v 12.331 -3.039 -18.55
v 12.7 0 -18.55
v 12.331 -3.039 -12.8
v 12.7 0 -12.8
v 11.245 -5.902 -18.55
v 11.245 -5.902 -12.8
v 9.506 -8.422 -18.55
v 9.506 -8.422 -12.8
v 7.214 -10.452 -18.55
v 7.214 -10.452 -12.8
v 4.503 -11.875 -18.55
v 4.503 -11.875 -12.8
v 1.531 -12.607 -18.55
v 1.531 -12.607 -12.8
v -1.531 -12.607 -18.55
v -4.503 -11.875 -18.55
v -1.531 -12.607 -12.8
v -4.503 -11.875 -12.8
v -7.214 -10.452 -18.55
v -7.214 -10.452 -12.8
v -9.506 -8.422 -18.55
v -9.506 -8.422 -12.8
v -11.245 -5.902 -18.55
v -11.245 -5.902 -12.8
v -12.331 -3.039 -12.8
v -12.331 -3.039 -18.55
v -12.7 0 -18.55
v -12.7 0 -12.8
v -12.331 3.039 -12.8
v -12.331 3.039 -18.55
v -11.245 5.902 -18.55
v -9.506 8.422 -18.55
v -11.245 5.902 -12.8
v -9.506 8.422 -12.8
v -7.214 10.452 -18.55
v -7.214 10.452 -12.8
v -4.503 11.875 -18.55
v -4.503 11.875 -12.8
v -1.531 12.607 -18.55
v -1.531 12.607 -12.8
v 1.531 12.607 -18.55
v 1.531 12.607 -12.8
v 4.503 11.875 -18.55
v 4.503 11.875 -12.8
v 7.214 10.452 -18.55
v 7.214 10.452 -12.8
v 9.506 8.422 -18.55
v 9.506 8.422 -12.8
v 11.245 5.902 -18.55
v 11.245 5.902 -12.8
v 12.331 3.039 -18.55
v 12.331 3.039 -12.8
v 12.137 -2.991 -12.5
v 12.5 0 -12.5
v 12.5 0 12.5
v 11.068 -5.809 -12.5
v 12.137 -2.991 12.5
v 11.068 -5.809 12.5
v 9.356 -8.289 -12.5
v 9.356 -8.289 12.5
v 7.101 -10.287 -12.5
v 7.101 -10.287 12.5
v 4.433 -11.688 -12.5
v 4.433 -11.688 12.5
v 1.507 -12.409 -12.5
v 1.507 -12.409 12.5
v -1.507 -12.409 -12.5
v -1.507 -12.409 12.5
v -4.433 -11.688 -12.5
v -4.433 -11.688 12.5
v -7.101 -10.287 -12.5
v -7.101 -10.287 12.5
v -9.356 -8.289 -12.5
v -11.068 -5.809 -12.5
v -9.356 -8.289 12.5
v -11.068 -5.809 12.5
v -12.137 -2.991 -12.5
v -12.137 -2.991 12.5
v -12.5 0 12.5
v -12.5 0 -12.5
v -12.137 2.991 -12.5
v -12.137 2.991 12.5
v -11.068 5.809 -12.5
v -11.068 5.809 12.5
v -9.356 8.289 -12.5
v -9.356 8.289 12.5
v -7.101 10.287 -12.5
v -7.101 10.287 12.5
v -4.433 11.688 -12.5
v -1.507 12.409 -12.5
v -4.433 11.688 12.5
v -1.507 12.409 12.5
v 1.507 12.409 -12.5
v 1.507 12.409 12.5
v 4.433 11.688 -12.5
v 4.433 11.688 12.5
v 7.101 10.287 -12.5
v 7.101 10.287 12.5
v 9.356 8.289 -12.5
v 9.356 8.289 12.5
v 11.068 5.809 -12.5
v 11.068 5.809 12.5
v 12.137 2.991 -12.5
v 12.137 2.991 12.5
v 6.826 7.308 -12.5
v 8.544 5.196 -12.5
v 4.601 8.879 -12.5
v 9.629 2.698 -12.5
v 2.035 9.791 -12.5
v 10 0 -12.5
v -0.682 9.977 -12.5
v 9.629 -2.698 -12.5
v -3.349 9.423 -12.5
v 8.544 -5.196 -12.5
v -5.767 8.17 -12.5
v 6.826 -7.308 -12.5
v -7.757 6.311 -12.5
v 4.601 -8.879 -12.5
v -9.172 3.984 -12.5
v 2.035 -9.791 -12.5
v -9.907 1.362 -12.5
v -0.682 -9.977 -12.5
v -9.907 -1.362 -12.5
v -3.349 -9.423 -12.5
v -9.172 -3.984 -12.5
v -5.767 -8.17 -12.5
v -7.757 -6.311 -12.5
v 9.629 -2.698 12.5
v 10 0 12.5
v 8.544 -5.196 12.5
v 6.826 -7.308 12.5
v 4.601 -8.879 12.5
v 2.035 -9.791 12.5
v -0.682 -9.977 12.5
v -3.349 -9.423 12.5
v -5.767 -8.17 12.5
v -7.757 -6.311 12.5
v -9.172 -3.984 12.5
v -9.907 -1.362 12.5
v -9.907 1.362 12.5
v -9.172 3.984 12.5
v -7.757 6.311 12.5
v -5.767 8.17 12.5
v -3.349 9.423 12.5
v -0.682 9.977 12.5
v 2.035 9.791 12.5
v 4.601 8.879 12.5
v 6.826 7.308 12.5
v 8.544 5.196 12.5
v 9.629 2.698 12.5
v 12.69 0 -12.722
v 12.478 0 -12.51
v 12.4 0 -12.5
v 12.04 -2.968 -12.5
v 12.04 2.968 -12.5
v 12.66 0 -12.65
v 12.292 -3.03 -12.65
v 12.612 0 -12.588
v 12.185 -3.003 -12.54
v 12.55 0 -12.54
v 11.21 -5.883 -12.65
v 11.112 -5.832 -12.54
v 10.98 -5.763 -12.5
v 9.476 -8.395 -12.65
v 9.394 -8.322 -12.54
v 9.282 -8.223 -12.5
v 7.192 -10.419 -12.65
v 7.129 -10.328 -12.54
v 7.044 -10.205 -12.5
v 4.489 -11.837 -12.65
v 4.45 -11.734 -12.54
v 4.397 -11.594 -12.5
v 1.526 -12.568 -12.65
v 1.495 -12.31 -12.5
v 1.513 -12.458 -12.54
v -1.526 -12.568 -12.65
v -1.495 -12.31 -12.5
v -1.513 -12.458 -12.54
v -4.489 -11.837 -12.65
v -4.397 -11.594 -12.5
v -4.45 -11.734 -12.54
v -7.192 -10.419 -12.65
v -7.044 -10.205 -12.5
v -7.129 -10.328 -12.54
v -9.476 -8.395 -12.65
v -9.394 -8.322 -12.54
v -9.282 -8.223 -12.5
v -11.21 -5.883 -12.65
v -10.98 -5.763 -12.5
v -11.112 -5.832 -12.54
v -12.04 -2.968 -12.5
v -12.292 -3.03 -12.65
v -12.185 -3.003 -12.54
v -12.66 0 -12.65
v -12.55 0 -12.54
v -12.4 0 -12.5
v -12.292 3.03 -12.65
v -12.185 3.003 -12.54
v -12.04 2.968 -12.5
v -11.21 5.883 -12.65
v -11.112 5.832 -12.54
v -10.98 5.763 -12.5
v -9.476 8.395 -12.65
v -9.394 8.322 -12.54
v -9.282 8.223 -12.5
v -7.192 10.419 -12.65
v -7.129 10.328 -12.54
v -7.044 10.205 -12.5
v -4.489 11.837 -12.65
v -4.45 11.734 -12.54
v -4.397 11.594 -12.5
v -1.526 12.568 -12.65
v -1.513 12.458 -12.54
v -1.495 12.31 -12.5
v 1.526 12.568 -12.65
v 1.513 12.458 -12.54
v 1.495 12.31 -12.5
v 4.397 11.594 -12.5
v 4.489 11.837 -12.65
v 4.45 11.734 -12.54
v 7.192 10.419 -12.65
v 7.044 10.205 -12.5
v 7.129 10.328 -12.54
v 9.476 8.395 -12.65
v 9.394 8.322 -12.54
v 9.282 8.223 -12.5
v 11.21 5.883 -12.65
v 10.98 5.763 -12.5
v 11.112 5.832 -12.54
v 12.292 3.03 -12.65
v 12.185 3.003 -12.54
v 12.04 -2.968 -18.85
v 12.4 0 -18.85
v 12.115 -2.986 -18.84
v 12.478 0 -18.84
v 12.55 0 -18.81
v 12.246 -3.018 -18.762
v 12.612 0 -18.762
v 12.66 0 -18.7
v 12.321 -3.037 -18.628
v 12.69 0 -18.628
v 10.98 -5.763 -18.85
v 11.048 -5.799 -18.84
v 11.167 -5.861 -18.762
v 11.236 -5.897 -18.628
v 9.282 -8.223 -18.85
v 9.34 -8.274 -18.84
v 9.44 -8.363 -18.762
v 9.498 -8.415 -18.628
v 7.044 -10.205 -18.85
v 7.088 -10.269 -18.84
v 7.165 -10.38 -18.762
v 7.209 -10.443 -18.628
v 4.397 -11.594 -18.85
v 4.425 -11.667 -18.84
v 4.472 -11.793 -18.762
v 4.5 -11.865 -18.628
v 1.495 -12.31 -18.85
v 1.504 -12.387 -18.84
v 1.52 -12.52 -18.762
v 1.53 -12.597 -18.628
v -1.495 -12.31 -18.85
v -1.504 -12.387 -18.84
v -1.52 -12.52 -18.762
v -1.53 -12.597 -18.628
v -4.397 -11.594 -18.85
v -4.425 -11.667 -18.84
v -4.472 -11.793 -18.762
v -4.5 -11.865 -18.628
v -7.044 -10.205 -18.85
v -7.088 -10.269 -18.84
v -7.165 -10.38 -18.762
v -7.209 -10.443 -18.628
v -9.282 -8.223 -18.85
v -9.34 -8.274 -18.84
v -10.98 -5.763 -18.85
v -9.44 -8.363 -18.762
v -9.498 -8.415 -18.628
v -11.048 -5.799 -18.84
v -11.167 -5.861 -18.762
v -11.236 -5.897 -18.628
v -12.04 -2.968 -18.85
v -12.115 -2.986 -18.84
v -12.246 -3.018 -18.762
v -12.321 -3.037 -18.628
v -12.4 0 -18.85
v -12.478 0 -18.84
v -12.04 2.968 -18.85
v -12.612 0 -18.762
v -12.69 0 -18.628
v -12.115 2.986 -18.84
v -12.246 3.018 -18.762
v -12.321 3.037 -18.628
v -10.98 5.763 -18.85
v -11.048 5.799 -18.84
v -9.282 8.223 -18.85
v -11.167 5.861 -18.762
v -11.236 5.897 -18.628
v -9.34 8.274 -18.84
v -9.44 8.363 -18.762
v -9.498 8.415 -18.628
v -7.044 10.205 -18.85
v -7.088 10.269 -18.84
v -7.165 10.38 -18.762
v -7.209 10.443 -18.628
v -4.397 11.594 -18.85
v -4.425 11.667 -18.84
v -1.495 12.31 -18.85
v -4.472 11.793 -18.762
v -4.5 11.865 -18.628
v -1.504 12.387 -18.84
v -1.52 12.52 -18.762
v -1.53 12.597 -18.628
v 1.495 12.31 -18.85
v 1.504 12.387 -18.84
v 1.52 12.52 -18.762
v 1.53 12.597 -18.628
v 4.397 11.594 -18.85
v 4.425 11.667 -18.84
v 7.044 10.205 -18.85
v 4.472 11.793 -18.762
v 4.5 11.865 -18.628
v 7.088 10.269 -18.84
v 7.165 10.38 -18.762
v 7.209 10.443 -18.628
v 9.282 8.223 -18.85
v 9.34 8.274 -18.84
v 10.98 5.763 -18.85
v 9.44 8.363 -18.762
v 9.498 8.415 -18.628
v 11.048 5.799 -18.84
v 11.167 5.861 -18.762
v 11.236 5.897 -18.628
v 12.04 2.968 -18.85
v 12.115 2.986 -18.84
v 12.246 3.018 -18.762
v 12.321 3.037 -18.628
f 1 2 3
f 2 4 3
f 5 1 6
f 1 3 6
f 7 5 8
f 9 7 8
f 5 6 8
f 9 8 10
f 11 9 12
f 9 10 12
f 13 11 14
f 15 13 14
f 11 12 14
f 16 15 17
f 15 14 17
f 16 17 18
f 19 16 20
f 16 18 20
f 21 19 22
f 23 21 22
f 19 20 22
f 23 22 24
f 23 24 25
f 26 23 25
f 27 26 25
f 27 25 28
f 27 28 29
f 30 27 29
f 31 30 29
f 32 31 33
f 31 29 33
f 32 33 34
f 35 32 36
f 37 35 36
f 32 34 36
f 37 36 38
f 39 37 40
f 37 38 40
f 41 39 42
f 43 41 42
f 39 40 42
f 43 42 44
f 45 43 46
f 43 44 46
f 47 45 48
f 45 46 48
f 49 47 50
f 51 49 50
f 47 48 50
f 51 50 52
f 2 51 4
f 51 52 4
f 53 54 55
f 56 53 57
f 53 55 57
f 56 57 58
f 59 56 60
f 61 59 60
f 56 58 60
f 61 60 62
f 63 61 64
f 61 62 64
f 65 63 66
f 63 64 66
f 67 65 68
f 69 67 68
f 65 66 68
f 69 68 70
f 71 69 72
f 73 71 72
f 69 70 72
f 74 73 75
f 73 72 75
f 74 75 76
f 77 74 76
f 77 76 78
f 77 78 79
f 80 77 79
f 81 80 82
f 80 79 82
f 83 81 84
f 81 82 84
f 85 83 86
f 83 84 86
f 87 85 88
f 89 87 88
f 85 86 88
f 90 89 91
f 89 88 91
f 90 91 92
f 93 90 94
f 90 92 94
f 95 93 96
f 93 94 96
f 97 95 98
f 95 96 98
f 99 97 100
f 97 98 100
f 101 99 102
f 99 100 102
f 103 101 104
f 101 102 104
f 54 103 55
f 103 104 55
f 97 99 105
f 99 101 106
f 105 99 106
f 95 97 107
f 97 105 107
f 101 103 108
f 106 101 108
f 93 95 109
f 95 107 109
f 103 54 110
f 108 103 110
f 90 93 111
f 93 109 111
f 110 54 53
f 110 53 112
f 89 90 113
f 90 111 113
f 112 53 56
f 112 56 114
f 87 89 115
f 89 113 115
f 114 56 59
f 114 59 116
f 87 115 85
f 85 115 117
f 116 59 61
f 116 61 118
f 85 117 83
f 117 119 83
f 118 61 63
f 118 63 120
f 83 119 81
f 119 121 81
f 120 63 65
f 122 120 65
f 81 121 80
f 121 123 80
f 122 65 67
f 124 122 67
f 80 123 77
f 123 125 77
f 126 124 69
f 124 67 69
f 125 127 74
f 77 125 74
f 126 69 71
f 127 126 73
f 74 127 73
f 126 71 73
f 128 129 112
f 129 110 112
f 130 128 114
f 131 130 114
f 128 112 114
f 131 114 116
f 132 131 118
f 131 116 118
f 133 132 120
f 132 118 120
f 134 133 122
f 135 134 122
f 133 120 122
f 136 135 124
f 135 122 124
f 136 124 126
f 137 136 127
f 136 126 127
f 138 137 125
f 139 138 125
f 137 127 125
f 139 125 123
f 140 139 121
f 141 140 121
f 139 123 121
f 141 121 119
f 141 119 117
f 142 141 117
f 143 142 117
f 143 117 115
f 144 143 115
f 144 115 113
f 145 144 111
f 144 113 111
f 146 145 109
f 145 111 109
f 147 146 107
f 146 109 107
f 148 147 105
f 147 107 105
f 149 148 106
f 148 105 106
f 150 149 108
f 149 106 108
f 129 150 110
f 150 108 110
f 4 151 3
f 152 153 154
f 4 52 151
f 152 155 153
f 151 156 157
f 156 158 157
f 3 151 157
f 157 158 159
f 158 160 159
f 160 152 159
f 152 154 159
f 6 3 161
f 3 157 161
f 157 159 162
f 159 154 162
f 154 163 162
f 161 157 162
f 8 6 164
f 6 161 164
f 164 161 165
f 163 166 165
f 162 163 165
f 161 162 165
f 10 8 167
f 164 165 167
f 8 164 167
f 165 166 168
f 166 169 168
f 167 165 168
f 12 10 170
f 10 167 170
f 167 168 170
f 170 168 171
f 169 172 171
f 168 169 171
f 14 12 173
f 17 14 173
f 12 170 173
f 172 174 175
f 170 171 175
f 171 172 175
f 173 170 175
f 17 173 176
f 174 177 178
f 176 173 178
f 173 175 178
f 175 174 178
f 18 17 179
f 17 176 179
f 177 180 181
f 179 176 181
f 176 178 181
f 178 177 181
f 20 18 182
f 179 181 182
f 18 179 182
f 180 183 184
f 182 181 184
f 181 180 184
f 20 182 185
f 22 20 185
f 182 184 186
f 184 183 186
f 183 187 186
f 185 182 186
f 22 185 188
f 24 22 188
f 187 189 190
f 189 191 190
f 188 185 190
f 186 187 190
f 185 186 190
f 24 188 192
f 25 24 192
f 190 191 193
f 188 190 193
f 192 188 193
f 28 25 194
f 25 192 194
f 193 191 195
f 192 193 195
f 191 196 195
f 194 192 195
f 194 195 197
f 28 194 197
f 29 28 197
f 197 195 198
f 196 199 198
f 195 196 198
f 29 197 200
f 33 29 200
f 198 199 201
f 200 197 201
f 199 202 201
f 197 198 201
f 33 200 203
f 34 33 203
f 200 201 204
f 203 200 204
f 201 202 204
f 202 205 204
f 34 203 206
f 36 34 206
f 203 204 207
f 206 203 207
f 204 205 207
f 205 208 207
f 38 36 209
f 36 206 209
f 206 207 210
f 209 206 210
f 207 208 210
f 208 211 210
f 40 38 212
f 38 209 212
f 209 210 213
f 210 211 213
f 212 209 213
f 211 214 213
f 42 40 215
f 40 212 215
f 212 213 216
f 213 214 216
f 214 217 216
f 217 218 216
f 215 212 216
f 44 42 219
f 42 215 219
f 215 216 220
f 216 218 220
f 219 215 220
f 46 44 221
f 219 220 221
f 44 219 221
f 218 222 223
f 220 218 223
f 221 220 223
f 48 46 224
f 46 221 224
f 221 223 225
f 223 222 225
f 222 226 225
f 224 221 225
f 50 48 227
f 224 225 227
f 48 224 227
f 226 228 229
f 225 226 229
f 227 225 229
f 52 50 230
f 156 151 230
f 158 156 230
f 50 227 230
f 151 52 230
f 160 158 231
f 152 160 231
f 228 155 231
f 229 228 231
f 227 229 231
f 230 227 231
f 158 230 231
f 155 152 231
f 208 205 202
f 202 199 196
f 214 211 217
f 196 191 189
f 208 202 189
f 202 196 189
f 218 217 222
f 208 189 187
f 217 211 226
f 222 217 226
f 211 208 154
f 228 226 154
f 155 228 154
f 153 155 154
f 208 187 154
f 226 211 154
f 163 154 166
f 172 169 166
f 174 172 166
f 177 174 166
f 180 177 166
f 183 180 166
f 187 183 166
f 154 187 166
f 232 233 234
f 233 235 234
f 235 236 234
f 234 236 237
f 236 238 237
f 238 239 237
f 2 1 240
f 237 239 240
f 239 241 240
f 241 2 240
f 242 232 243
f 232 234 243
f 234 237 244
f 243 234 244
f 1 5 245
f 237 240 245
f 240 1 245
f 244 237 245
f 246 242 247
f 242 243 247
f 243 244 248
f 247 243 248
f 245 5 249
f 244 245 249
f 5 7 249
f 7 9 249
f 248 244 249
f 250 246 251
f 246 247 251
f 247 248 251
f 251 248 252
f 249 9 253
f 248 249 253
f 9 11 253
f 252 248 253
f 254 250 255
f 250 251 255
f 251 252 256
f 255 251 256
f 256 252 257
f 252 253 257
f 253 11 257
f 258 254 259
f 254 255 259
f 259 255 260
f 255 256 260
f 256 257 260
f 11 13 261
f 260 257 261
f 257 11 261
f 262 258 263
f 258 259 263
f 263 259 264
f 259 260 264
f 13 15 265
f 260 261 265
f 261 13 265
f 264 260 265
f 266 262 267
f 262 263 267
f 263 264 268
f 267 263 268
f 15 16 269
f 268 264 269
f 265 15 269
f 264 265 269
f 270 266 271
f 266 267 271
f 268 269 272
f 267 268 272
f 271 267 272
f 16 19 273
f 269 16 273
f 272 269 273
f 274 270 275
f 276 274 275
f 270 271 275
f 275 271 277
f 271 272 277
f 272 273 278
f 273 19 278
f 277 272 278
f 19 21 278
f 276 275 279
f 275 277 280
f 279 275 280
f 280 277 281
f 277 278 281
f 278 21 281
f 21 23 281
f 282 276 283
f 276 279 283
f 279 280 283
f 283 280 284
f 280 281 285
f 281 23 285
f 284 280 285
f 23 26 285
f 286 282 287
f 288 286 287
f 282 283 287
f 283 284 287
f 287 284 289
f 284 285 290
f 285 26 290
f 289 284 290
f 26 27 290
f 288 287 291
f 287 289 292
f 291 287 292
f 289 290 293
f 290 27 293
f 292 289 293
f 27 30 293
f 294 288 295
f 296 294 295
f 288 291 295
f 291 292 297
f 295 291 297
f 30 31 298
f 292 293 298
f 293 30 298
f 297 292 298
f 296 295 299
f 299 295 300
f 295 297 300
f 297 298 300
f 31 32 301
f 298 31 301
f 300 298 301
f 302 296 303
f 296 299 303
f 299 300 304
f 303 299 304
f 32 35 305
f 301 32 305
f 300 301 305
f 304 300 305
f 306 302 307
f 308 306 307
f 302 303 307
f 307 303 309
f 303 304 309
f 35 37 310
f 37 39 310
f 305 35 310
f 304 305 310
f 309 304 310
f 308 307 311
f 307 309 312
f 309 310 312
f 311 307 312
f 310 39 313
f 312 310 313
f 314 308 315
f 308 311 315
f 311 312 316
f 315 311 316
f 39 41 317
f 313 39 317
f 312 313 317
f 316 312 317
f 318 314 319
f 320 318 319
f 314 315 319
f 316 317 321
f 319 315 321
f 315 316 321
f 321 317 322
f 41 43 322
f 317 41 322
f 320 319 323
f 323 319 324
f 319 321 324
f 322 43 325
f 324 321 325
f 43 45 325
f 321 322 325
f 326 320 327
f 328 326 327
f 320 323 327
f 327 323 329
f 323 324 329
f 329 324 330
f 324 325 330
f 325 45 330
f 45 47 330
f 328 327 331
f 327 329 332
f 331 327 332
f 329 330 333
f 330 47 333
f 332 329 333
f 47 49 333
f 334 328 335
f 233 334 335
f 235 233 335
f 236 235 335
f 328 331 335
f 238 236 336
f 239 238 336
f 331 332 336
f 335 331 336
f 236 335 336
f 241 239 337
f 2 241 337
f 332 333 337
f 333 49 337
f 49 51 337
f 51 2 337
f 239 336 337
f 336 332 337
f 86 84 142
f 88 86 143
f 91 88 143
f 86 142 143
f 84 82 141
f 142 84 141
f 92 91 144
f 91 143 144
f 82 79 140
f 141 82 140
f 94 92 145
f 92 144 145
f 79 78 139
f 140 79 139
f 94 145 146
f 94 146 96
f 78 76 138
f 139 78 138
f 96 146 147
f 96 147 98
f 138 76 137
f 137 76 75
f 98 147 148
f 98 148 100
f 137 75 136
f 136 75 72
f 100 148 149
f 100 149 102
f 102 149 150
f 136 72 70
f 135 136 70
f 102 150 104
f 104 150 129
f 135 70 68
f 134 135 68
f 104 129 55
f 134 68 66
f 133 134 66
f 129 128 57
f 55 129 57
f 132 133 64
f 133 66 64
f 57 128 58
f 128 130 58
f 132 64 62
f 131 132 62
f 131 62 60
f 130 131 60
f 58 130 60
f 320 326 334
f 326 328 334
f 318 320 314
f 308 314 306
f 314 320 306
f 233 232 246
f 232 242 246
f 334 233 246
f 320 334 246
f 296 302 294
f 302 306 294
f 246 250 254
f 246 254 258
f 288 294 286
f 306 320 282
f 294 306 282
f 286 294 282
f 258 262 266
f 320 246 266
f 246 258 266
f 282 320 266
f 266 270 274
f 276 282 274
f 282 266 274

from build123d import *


with BuildPart() as f1:
    # F0 (on Front) → F1 (revolve)
    with BuildSketch(Plane.XZ):
        Polygon((12.5, 12.5), (10, 12.5), (10, -12.5), (12.4, -12.5), (12.5, -12.5), align=None)
    revolve(axis=Axis((0, 0, 0), (0, 0, -1)))


with BuildPart() as f3:
    # F0 (on Front) → F3 (revolve)
    with BuildSketch(Plane.XZ):
        with BuildLine():
            Line((12.4, -12.5), (10, -12.5))
            Line((10, -12.5), (0, -12.5))
            Line((0, -12.5), (0, -18.85))
            Line((0, -18.85), (12.4, -18.85))
            ThreePointArc((12.4, -18.85), (12.612132, -18.762132), (12.7, -18.55))
            Line((12.7, -18.55), (12.7, -12.8))
            ThreePointArc((12.7, -12.8), (12.612132, -12.587868), (12.4, -12.5))
        make_face()
    revolve(axis=Axis((0, 0, -15.675), (0, 0, -1)))


solid = Compound([f1.part, f3.part])
